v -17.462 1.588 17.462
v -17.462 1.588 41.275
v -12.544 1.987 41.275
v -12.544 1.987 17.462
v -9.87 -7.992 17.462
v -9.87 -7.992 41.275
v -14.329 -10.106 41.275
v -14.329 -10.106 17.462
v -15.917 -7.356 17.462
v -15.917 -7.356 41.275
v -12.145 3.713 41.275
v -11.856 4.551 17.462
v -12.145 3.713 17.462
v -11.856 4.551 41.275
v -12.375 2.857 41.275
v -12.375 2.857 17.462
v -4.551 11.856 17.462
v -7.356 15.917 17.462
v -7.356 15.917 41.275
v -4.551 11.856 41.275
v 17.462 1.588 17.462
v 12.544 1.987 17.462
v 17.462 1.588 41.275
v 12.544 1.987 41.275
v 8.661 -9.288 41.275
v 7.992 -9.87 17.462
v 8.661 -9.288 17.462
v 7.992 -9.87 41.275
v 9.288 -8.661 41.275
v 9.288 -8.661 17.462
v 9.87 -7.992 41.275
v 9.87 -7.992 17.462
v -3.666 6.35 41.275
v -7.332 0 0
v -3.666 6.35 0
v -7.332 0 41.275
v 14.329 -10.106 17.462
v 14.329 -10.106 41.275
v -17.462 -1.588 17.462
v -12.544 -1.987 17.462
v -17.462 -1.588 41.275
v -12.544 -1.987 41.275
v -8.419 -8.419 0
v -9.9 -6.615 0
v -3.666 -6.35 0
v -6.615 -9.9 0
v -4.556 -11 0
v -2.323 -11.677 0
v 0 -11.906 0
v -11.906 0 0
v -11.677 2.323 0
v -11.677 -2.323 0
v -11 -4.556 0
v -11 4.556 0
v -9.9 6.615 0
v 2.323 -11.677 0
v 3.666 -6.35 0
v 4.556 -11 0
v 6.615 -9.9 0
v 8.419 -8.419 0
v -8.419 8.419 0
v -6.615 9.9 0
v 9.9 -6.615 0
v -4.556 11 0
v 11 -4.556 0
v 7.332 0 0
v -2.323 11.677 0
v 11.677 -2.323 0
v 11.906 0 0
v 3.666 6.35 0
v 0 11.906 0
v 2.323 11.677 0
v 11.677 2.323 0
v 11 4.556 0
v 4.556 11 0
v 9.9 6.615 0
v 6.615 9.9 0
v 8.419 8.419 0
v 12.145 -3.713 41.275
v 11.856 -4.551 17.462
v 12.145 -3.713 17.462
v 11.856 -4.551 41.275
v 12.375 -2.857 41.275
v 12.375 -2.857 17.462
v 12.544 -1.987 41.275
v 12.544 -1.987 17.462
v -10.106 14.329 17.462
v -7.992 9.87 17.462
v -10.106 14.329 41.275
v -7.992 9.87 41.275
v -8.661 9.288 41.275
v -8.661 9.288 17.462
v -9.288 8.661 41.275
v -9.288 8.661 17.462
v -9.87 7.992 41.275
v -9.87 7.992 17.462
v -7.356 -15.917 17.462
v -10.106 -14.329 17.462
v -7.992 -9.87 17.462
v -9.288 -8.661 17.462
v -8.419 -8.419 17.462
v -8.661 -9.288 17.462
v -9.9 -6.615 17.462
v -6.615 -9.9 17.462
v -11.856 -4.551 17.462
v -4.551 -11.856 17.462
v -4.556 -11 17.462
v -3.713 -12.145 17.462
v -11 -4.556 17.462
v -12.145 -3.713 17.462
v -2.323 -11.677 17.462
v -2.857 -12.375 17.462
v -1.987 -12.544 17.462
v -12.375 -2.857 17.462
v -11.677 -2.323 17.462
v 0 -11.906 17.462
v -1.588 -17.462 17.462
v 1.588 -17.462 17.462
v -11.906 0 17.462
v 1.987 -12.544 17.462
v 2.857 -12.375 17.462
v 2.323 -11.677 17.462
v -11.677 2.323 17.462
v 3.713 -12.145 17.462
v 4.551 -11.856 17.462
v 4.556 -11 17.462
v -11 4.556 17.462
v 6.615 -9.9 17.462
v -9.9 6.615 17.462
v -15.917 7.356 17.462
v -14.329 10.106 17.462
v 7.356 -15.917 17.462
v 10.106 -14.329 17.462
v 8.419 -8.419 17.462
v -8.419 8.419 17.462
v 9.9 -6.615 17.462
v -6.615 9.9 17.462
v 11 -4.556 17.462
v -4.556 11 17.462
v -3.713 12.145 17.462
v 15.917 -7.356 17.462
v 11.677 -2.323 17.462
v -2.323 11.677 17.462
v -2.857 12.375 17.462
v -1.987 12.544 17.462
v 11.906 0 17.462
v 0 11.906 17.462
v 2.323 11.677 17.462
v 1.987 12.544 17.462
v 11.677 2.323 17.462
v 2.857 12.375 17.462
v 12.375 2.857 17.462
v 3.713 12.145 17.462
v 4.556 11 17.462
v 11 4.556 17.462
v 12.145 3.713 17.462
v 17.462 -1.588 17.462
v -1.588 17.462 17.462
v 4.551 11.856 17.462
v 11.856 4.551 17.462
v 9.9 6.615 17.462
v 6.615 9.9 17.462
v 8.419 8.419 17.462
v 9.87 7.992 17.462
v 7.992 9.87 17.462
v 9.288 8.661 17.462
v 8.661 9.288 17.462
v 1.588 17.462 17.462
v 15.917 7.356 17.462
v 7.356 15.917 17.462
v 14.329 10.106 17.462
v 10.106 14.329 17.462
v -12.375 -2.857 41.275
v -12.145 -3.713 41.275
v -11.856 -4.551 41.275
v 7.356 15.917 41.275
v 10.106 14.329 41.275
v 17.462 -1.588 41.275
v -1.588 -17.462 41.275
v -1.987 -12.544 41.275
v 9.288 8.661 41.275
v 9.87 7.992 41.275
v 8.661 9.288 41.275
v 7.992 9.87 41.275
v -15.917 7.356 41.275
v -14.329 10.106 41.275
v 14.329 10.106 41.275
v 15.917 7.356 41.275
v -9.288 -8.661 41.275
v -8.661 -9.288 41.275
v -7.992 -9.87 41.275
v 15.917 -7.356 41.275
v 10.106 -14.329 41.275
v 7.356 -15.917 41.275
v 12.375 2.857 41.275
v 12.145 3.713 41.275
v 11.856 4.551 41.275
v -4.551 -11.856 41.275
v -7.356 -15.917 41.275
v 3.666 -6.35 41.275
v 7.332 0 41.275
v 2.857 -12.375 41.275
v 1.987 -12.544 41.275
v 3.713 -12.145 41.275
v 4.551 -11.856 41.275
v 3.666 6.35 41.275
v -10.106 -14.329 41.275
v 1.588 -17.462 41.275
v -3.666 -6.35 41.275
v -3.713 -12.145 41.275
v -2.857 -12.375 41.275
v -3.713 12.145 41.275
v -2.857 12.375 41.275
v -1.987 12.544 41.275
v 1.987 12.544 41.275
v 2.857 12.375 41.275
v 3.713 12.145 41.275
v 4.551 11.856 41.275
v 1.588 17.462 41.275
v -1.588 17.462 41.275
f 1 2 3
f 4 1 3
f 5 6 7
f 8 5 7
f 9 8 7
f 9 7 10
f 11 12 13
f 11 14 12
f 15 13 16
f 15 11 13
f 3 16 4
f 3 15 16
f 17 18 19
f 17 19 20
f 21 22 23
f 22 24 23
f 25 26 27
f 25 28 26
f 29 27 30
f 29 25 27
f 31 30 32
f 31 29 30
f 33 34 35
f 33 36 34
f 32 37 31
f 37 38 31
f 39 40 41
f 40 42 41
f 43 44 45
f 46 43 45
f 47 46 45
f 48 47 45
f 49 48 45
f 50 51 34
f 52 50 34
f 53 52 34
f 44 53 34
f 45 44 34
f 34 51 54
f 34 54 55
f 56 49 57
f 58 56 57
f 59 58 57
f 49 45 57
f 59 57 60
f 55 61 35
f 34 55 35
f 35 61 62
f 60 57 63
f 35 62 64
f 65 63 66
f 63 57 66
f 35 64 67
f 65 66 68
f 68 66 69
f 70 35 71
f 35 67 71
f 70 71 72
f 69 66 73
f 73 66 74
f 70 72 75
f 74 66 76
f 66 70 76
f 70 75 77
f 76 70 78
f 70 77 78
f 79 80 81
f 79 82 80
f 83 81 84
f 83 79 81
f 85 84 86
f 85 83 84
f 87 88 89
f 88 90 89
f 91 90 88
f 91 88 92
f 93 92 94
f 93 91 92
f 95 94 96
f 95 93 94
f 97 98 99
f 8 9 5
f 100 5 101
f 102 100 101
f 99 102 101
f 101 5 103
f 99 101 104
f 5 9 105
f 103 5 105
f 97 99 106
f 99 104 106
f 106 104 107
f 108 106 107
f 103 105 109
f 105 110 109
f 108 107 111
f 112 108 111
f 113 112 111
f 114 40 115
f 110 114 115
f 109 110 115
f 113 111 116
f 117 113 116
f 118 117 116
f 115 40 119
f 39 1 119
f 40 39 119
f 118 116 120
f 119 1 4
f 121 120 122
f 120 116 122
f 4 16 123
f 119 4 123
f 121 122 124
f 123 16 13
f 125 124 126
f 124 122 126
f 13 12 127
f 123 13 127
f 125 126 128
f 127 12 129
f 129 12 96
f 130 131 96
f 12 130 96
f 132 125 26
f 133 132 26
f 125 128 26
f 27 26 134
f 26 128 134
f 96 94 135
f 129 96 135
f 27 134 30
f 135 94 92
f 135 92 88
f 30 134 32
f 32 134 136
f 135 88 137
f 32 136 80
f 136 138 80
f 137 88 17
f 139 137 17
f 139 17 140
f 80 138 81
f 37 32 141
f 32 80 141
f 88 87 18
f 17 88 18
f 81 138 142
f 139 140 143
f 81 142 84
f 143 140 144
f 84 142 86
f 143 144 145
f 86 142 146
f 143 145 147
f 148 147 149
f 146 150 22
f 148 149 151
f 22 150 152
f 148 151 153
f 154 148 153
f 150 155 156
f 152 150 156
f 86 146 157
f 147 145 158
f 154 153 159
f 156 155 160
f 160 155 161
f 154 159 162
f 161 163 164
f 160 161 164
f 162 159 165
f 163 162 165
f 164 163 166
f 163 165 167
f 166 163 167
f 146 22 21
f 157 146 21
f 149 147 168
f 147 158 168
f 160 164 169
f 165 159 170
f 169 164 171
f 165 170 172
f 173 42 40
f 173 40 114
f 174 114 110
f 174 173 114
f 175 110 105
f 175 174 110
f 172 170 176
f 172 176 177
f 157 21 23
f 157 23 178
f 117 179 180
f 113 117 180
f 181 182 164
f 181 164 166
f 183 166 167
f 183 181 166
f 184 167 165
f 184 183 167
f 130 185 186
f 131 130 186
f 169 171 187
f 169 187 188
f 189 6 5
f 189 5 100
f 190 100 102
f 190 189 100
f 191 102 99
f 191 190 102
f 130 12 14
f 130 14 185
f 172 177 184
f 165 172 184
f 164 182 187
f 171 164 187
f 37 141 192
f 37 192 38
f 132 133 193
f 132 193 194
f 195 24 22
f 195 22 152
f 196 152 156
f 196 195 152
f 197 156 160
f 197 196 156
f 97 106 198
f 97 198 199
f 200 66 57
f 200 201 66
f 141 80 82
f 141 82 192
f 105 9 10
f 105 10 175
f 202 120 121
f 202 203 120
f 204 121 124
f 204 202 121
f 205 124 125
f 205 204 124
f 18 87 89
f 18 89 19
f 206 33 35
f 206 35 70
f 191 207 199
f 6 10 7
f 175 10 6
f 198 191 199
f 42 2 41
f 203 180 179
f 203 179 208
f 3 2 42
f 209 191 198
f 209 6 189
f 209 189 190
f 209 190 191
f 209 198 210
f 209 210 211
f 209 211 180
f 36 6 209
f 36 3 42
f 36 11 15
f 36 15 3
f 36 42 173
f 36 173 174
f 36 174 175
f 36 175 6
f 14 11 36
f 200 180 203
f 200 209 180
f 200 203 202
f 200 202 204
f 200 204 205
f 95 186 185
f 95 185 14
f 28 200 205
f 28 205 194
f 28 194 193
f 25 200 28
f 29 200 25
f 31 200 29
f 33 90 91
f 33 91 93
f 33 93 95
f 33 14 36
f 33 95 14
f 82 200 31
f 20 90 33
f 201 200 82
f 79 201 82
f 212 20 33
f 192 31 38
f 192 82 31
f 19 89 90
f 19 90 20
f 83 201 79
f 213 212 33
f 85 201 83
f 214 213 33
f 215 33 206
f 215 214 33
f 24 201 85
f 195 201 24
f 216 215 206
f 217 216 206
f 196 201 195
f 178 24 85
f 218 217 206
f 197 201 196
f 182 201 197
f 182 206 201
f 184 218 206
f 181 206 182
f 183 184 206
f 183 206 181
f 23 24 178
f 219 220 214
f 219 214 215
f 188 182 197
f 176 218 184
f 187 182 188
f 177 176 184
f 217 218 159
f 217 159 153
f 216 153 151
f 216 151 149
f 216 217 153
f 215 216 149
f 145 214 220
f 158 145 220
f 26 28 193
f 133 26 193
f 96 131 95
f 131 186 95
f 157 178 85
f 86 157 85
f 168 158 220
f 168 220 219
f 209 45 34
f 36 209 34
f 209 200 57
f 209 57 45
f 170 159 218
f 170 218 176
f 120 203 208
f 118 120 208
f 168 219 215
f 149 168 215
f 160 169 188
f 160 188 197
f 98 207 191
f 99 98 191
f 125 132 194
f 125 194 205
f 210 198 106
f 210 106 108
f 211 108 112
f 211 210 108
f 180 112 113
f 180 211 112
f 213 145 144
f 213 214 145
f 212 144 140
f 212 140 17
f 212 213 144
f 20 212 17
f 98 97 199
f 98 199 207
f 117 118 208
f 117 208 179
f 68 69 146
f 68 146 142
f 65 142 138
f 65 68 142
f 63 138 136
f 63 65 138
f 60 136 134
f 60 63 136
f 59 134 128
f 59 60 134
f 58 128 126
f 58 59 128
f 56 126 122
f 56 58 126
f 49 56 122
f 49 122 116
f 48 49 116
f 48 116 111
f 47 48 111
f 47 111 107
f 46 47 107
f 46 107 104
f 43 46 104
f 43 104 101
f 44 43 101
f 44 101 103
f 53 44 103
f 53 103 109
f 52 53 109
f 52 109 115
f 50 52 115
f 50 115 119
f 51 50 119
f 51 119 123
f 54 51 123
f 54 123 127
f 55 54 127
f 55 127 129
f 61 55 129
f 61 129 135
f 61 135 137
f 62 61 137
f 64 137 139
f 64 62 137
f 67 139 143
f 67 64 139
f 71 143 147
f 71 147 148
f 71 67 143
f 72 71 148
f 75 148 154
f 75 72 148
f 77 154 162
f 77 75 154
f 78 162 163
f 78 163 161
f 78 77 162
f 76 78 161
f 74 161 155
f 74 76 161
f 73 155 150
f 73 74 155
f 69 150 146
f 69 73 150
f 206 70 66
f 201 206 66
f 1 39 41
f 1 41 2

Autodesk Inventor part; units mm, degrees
ref_plane "YZ Plane" through (0, 0, 0) normal (1, 0, 0) x (0, 1, 0)
ref_plane "XZ Plane" through (0, 0, 0) normal (0, 1, 0) x (-1, 0, 0)
ref_plane "XY Plane" through (0, 0, 0) normal (0, 0, 1) x (1, 0, 0)
sketch "Sketch1" plane through (0, 0, 0) normal (0, 0, 1) x (1, 0, 0)
  circle A0 centre (0, 0) radius 11.9062
  dimension "d0" = 23.8125
extrude "Extrusion1" add sketch "Sketch1" along normal blind 41.275
sketch "Sketch2" plane through (0, 0, 41.275) normal (0, 0, 1) x (1, 0, 0)
  circle A0 centre (0, 0) radius 12.7
  dimension "d3" = 25.4
extrude "Extrusion2" add sketch "Sketch2" against normal blind 23.8125
sketch "Sketch3" plane through (0, 0, 41.275) normal (0, 0, 1) x (1, 0, 0)
  line L0 (-3.6662, 6.35) -> (3.6662, 6.35)
  line L1 (3.6662, 6.35) -> (7.3323, 0)
  line L2 (7.3323, 0) -> (3.6662, -6.35)
  line L3 (3.6662, -6.35) -> (-3.6662, -6.35)
  line L4 (-3.6662, -6.35) -> (-7.3323, 0)
  line L5 (-7.3323, 0) -> (-3.6662, 6.35)
  point P0 (0, 0)
  dimension "d6" = 12.7
  dimension "d7" = 12.7
  dimension "d8" = 12.7
  dimension "d9" = 120
  dimension "d10" = 120
  dimension "d11" = 6.35
  dimension "d12" = 6.35
  dimension "d13" = 6.35
extrude "Extrusion3" cut sketch "Sketch3" against normal blind 50.8
sketch "Sketch4" plane through (0, 0, 41.275) normal (0, 0, 1) x (1, 0, 0)
  line L0 (-7.3323, 0) -> (-3.6662, 6.35) projected
  line L1 (-3.6662, 6.35) -> (3.6662, 6.35) projected
  line L2 (3.6662, 6.35) -> (7.3323, 0) projected
  line L3 (7.3323, 0) -> (3.6662, -6.35) projected
  line L4 (3.6662, -6.35) -> (-3.6662, -6.35) projected
  line L5 (-3.6662, -6.35) -> (-7.3323, 0) projected
  circle A0 centre (0, 0) radius 12.7 projected
  line L6 (0, 12.7) -> (0, 17.4625) construction
  line L7 (0, 12.7) -> (4.7625, 12.7) construction
  line L8 (0, 0) -> (1.9867, 12.5436) construction
  circle A1 centre (0, 0) radius 12.7 construction
  line L9 (0, 0) -> (12.7, 0) construction
  line L10 (0, 0) -> (-1.9867, 12.5436) construction
  line L11 (0, 0) -> (12.7, 0) construction
  line L12 (0, 17.4625) -> (0.7937, 17.4625) construction
  line L13 (0, 17.4625) -> (0.7937, 17.4625) construction
  line L14 (0, 17.4625) -> (-1.5875, 17.4625) construction
  line L15 (0, 17.4625) -> (1.5875, 17.4625) construction
  line L16 (-1.9867, 12.5436) -> (-1.5875, 17.4625)
  line L17 (-1.5875, 17.4625) -> (1.5875, 17.4625)
  line L18 (1.5875, 17.4625) -> (1.9867, 12.5436)
  line L19 (-1.9867, 12.5436) -> (1.9867, 12.5436)
  line L20 (-6.35, 10.9985) -> (-8.7312, 15.123) construction
  line L21 (-6.35, 10.9985) -> (-2.2256, 13.3798) construction
  line L22 (0, 0) -> (-4.5513, 11.8565) construction
  line L23 (0, 0) -> (-7.9924, 9.8698) construction
  line L24 (-8.7312, 15.123) -> (-8.0438, 15.5198) construction
  line L25 (-8.7312, 15.123) -> (-8.0438, 15.5198) construction
  line L26 (-8.7312, 15.123) -> (-10.1061, 14.3292) construction
  line L27 (-8.7312, 15.123) -> (-7.3564, 15.9167) construction
  line L28 (-7.9924, 9.8698) -> (-10.1061, 14.3292)
  line L29 (-10.1061, 14.3292) -> (-7.3564, 15.9167)
  line L30 (-7.3564, 15.9167) -> (-4.5513, 11.8565)
  line L31 (-7.9924, 9.8698) -> (-4.5513, 11.8565)
  line L32 (-10.9985, 6.35) -> (-15.123, 8.7313) construction
  line L33 (-10.9985, 6.35) -> (-8.6173, 10.4744) construction
  line L34 (0, 0) -> (-9.8698, 7.9924) construction
  line L35 (0, 0) -> (-11.8565, 4.5513) construction
  line L36 (-15.123, 8.7313) -> (-14.7261, 9.4187) construction
  line L37 (-15.123, 8.7313) -> (-14.7261, 9.4187) construction
  line L38 (-15.123, 8.7313) -> (-15.9167, 7.3564) construction
  line L39 (-15.123, 8.7313) -> (-14.3292, 10.1061) construction
  line L40 (-11.8565, 4.5513) -> (-15.9167, 7.3564)
  line L41 (-15.9167, 7.3564) -> (-14.3292, 10.1061)
  line L42 (-14.3292, 10.1061) -> (-9.8698, 7.9924)
  line L43 (-11.8565, 4.5513) -> (-9.8698, 7.9924)
  line L44 (-12.7, 0) -> (-17.4625, 0) construction
  line L45 (-12.7, 0) -> (-12.7, 4.7625) construction
  line L46 (0, 0) -> (-12.5436, 1.9867) construction
  line L47 (0, 0) -> (-12.5436, -1.9867) construction
  line L48 (-17.4625, 0) -> (-17.4625, 0.7938) construction
  line L49 (-17.4625, 0) -> (-17.4625, 0.7938) construction
  line L50 (-17.4625, 0) -> (-17.4625, -1.5875) construction
  line L51 (-17.4625, 0) -> (-17.4625, 1.5875) construction
  line L52 (-12.5436, -1.9867) -> (-17.4625, -1.5875)
  line L53 (-17.4625, -1.5875) -> (-17.4625, 1.5875)
  line L54 (-17.4625, 1.5875) -> (-12.5436, 1.9867)
  line L55 (-12.5436, -1.9867) -> (-12.5436, 1.9867)
  line L56 (-10.9985, -6.35) -> (-15.123, -8.7312) construction
  line L57 (-10.9985, -6.35) -> (-13.3798, -2.2256) construction
  line L58 (0, 0) -> (-11.8565, -4.5513) construction
  line L59 (0, 0) -> (-9.8698, -7.9924) construction
  line L60 (-15.123, -8.7312) -> (-15.5198, -8.0438) construction
  line L61 (-15.123, -8.7312) -> (-15.5198, -8.0438) construction
  line L62 (-15.123, -8.7312) -> (-14.3292, -10.1061) construction
  line L63 (-15.123, -8.7312) -> (-15.9167, -7.3564) construction
  line L64 (-9.8698, -7.9924) -> (-14.3292, -10.1061)
  line L65 (-14.3292, -10.1061) -> (-15.9167, -7.3564)
  line L66 (-15.9167, -7.3564) -> (-11.8565, -4.5513)
  line L67 (-9.8698, -7.9924) -> (-11.8565, -4.5513)
  line L68 (-6.35, -10.9985) -> (-8.7313, -15.123) construction
  line L69 (-6.35, -10.9985) -> (-10.4744, -8.6173) construction
  line L70 (0, 0) -> (-7.9924, -9.8698) construction
  line L71 (0, 0) -> (-4.5513, -11.8565) construction
  line L72 (-8.7313, -15.123) -> (-9.4187, -14.7261) construction
  line L73 (-8.7313, -15.123) -> (-9.4187, -14.7261) construction
  line L74 (-8.7313, -15.123) -> (-7.3564, -15.9167) construction
  line L75 (-8.7313, -15.123) -> (-10.1061, -14.3292) construction
  line L76 (-4.5513, -11.8565) -> (-7.3564, -15.9167)
  line L77 (-7.3564, -15.9167) -> (-10.1061, -14.3292)
  line L78 (-10.1061, -14.3292) -> (-7.9924, -9.8698)
  line L79 (-4.5513, -11.8565) -> (-7.9924, -9.8698)
  line L80 (0, -12.7) -> (0, -17.4625) construction
  line L81 (0, -12.7) -> (-4.7625, -12.7) construction
  line L82 (0, 0) -> (-1.9867, -12.5436) construction
  line L83 (0, 0) -> (1.9867, -12.5436) construction
  line L84 (0, -17.4625) -> (-0.7938, -17.4625) construction
  line L85 (0, -17.4625) -> (-0.7938, -17.4625) construction
  line L86 (0, -17.4625) -> (1.5875, -17.4625) construction
  line L87 (0, -17.4625) -> (-1.5875, -17.4625) construction
  line L88 (1.9867, -12.5436) -> (1.5875, -17.4625)
  line L89 (1.5875, -17.4625) -> (-1.5875, -17.4625)
  line L90 (-1.5875, -17.4625) -> (-1.9867, -12.5436)
  line L91 (1.9867, -12.5436) -> (-1.9867, -12.5436)
  line L92 (6.35, -10.9985) -> (8.7312, -15.123) construction
  line L93 (6.35, -10.9985) -> (2.2256, -13.3798) construction
  line L94 (0, 0) -> (4.5513, -11.8565) construction
  line L95 (0, 0) -> (7.9924, -9.8698) construction
  line L96 (8.7312, -15.123) -> (8.0438, -15.5198) construction
  line L97 (8.7312, -15.123) -> (8.0438, -15.5198) construction
  line L98 (8.7312, -15.123) -> (10.1061, -14.3292) construction
  line L99 (8.7312, -15.123) -> (7.3564, -15.9167) construction
  line L100 (7.9924, -9.8698) -> (10.1061, -14.3292)
  line L101 (10.1061, -14.3292) -> (7.3564, -15.9167)
  line L102 (7.3564, -15.9167) -> (4.5513, -11.8565)
  line L103 (7.9924, -9.8698) -> (4.5513, -11.8565)
  line L104 (10.9985, -6.35) -> (15.123, -8.7313) construction
  line L105 (10.9985, -6.35) -> (8.6173, -10.4744) construction
  line L106 (0, 0) -> (9.8698, -7.9924) construction
  line L107 (0, 0) -> (11.8565, -4.5513) construction
  line L108 (15.123, -8.7313) -> (14.7261, -9.4187) construction
  line L109 (15.123, -8.7313) -> (14.7261, -9.4187) construction
  line L110 (15.123, -8.7313) -> (15.9167, -7.3564) construction
  line L111 (15.123, -8.7313) -> (14.3292, -10.1061) construction
  line L112 (11.8565, -4.5513) -> (15.9167, -7.3564)
  line L113 (15.9167, -7.3564) -> (14.3292, -10.1061)
  line L114 (14.3292, -10.1061) -> (9.8698, -7.9924)
  line L115 (11.8565, -4.5513) -> (9.8698, -7.9924)
  line L116 (12.7, 0) -> (17.4625, 0) construction
  line L117 (12.7, 0) -> (12.7, -4.7625) construction
  line L118 (0, 0) -> (12.5436, -1.9867) construction
  line L119 (0, 0) -> (12.5436, 1.9867) construction
  line L120 (17.4625, 0) -> (17.4625, -0.7938) construction
  line L121 (17.4625, 0) -> (17.4625, -0.7938) construction
  line L122 (17.4625, 0) -> (17.4625, 1.5875) construction
  line L123 (17.4625, 0) -> (17.4625, -1.5875) construction
  line L124 (12.5436, 1.9867) -> (17.4625, 1.5875)
  line L125 (17.4625, 1.5875) -> (17.4625, -1.5875)
  line L126 (17.4625, -1.5875) -> (12.5436, -1.9867)
  line L127 (12.5436, 1.9867) -> (12.5436, -1.9867)
  line L128 (10.9985, 6.35) -> (15.123, 8.7313) construction
  line L129 (10.9985, 6.35) -> (13.3798, 2.2256) construction
  line L130 (0, 0) -> (11.8565, 4.5513) construction
  line L131 (0, 0) -> (9.8698, 7.9924) construction
  line L132 (15.123, 8.7313) -> (15.5198, 8.0438) construction
  line L133 (15.123, 8.7313) -> (15.5198, 8.0438) construction
  line L134 (15.123, 8.7313) -> (14.3292, 10.1061) construction
  line L135 (15.123, 8.7313) -> (15.9167, 7.3564) construction
  line L136 (9.8698, 7.9924) -> (14.3292, 10.1061)
  line L137 (14.3292, 10.1061) -> (15.9167, 7.3564)
  line L138 (15.9167, 7.3564) -> (11.8565, 4.5513)
  line L139 (9.8698, 7.9924) -> (11.8565, 4.5513)
  line L140 (6.35, 10.9985) -> (8.7312, 15.123) construction
  line L141 (6.35, 10.9985) -> (10.4744, 8.6173) construction
  line L142 (0, 0) -> (7.9924, 9.8698) construction
  line L143 (0, 0) -> (4.5513, 11.8565) construction
  line L144 (8.7312, 15.123) -> (9.4187, 14.7261) construction
  line L145 (8.7312, 15.123) -> (9.4187, 14.7261) construction
  line L146 (8.7312, 15.123) -> (7.3564, 15.9167) construction
  line L147 (8.7312, 15.123) -> (10.1061, 14.3292) construction
  line L148 (4.5513, 11.8565) -> (7.3564, 15.9167)
  line L149 (7.3564, 15.9167) -> (10.1061, 14.3292)
  line L150 (10.1061, 14.3292) -> (7.9924, 9.8698)
  line L151 (4.5513, 11.8565) -> (7.9924, 9.8698)
  dimension "d16" = 12.7
  dimension "d17" = 0
  dimension "d18" = 4.7625
  dimension "d19" = 90
  dimension "d20" = 81
  dimension "d21" = 99
  dimension "d22" = 0.7937
  dimension "d23" = 0
  dimension "d24" = 1.5875
  dimension "d25" = 180
  dimension "d28" = 360
extrude "Extrusion4" add sketch "Sketch4" against normal blind 23.8125 contours A0 L127 | A0 L124 L125 L126 | L139 A0 | A0 L136 L137 L138 | L112 L113 L114 A0 | A0 L115 | L151 A0 | A0 L148 L149 L150 | L100 L101 L102 A0 | A0 L103 | L19 A0 | A0 L16 L17 L18 | L88 L89 L90 A0 | A0 L91 | L31 A0 | A0 L28 L29 L30 | L76 L77 L78 A0 | A0 L79 | L43 A0 | A0 L40 L41 L42 | L64 L65 L66 A0 | A0 L67 | L55 A0 | A0 L52 L53 L54
properties part number "pinion" material "Nylon, molybdenum disulphide"
